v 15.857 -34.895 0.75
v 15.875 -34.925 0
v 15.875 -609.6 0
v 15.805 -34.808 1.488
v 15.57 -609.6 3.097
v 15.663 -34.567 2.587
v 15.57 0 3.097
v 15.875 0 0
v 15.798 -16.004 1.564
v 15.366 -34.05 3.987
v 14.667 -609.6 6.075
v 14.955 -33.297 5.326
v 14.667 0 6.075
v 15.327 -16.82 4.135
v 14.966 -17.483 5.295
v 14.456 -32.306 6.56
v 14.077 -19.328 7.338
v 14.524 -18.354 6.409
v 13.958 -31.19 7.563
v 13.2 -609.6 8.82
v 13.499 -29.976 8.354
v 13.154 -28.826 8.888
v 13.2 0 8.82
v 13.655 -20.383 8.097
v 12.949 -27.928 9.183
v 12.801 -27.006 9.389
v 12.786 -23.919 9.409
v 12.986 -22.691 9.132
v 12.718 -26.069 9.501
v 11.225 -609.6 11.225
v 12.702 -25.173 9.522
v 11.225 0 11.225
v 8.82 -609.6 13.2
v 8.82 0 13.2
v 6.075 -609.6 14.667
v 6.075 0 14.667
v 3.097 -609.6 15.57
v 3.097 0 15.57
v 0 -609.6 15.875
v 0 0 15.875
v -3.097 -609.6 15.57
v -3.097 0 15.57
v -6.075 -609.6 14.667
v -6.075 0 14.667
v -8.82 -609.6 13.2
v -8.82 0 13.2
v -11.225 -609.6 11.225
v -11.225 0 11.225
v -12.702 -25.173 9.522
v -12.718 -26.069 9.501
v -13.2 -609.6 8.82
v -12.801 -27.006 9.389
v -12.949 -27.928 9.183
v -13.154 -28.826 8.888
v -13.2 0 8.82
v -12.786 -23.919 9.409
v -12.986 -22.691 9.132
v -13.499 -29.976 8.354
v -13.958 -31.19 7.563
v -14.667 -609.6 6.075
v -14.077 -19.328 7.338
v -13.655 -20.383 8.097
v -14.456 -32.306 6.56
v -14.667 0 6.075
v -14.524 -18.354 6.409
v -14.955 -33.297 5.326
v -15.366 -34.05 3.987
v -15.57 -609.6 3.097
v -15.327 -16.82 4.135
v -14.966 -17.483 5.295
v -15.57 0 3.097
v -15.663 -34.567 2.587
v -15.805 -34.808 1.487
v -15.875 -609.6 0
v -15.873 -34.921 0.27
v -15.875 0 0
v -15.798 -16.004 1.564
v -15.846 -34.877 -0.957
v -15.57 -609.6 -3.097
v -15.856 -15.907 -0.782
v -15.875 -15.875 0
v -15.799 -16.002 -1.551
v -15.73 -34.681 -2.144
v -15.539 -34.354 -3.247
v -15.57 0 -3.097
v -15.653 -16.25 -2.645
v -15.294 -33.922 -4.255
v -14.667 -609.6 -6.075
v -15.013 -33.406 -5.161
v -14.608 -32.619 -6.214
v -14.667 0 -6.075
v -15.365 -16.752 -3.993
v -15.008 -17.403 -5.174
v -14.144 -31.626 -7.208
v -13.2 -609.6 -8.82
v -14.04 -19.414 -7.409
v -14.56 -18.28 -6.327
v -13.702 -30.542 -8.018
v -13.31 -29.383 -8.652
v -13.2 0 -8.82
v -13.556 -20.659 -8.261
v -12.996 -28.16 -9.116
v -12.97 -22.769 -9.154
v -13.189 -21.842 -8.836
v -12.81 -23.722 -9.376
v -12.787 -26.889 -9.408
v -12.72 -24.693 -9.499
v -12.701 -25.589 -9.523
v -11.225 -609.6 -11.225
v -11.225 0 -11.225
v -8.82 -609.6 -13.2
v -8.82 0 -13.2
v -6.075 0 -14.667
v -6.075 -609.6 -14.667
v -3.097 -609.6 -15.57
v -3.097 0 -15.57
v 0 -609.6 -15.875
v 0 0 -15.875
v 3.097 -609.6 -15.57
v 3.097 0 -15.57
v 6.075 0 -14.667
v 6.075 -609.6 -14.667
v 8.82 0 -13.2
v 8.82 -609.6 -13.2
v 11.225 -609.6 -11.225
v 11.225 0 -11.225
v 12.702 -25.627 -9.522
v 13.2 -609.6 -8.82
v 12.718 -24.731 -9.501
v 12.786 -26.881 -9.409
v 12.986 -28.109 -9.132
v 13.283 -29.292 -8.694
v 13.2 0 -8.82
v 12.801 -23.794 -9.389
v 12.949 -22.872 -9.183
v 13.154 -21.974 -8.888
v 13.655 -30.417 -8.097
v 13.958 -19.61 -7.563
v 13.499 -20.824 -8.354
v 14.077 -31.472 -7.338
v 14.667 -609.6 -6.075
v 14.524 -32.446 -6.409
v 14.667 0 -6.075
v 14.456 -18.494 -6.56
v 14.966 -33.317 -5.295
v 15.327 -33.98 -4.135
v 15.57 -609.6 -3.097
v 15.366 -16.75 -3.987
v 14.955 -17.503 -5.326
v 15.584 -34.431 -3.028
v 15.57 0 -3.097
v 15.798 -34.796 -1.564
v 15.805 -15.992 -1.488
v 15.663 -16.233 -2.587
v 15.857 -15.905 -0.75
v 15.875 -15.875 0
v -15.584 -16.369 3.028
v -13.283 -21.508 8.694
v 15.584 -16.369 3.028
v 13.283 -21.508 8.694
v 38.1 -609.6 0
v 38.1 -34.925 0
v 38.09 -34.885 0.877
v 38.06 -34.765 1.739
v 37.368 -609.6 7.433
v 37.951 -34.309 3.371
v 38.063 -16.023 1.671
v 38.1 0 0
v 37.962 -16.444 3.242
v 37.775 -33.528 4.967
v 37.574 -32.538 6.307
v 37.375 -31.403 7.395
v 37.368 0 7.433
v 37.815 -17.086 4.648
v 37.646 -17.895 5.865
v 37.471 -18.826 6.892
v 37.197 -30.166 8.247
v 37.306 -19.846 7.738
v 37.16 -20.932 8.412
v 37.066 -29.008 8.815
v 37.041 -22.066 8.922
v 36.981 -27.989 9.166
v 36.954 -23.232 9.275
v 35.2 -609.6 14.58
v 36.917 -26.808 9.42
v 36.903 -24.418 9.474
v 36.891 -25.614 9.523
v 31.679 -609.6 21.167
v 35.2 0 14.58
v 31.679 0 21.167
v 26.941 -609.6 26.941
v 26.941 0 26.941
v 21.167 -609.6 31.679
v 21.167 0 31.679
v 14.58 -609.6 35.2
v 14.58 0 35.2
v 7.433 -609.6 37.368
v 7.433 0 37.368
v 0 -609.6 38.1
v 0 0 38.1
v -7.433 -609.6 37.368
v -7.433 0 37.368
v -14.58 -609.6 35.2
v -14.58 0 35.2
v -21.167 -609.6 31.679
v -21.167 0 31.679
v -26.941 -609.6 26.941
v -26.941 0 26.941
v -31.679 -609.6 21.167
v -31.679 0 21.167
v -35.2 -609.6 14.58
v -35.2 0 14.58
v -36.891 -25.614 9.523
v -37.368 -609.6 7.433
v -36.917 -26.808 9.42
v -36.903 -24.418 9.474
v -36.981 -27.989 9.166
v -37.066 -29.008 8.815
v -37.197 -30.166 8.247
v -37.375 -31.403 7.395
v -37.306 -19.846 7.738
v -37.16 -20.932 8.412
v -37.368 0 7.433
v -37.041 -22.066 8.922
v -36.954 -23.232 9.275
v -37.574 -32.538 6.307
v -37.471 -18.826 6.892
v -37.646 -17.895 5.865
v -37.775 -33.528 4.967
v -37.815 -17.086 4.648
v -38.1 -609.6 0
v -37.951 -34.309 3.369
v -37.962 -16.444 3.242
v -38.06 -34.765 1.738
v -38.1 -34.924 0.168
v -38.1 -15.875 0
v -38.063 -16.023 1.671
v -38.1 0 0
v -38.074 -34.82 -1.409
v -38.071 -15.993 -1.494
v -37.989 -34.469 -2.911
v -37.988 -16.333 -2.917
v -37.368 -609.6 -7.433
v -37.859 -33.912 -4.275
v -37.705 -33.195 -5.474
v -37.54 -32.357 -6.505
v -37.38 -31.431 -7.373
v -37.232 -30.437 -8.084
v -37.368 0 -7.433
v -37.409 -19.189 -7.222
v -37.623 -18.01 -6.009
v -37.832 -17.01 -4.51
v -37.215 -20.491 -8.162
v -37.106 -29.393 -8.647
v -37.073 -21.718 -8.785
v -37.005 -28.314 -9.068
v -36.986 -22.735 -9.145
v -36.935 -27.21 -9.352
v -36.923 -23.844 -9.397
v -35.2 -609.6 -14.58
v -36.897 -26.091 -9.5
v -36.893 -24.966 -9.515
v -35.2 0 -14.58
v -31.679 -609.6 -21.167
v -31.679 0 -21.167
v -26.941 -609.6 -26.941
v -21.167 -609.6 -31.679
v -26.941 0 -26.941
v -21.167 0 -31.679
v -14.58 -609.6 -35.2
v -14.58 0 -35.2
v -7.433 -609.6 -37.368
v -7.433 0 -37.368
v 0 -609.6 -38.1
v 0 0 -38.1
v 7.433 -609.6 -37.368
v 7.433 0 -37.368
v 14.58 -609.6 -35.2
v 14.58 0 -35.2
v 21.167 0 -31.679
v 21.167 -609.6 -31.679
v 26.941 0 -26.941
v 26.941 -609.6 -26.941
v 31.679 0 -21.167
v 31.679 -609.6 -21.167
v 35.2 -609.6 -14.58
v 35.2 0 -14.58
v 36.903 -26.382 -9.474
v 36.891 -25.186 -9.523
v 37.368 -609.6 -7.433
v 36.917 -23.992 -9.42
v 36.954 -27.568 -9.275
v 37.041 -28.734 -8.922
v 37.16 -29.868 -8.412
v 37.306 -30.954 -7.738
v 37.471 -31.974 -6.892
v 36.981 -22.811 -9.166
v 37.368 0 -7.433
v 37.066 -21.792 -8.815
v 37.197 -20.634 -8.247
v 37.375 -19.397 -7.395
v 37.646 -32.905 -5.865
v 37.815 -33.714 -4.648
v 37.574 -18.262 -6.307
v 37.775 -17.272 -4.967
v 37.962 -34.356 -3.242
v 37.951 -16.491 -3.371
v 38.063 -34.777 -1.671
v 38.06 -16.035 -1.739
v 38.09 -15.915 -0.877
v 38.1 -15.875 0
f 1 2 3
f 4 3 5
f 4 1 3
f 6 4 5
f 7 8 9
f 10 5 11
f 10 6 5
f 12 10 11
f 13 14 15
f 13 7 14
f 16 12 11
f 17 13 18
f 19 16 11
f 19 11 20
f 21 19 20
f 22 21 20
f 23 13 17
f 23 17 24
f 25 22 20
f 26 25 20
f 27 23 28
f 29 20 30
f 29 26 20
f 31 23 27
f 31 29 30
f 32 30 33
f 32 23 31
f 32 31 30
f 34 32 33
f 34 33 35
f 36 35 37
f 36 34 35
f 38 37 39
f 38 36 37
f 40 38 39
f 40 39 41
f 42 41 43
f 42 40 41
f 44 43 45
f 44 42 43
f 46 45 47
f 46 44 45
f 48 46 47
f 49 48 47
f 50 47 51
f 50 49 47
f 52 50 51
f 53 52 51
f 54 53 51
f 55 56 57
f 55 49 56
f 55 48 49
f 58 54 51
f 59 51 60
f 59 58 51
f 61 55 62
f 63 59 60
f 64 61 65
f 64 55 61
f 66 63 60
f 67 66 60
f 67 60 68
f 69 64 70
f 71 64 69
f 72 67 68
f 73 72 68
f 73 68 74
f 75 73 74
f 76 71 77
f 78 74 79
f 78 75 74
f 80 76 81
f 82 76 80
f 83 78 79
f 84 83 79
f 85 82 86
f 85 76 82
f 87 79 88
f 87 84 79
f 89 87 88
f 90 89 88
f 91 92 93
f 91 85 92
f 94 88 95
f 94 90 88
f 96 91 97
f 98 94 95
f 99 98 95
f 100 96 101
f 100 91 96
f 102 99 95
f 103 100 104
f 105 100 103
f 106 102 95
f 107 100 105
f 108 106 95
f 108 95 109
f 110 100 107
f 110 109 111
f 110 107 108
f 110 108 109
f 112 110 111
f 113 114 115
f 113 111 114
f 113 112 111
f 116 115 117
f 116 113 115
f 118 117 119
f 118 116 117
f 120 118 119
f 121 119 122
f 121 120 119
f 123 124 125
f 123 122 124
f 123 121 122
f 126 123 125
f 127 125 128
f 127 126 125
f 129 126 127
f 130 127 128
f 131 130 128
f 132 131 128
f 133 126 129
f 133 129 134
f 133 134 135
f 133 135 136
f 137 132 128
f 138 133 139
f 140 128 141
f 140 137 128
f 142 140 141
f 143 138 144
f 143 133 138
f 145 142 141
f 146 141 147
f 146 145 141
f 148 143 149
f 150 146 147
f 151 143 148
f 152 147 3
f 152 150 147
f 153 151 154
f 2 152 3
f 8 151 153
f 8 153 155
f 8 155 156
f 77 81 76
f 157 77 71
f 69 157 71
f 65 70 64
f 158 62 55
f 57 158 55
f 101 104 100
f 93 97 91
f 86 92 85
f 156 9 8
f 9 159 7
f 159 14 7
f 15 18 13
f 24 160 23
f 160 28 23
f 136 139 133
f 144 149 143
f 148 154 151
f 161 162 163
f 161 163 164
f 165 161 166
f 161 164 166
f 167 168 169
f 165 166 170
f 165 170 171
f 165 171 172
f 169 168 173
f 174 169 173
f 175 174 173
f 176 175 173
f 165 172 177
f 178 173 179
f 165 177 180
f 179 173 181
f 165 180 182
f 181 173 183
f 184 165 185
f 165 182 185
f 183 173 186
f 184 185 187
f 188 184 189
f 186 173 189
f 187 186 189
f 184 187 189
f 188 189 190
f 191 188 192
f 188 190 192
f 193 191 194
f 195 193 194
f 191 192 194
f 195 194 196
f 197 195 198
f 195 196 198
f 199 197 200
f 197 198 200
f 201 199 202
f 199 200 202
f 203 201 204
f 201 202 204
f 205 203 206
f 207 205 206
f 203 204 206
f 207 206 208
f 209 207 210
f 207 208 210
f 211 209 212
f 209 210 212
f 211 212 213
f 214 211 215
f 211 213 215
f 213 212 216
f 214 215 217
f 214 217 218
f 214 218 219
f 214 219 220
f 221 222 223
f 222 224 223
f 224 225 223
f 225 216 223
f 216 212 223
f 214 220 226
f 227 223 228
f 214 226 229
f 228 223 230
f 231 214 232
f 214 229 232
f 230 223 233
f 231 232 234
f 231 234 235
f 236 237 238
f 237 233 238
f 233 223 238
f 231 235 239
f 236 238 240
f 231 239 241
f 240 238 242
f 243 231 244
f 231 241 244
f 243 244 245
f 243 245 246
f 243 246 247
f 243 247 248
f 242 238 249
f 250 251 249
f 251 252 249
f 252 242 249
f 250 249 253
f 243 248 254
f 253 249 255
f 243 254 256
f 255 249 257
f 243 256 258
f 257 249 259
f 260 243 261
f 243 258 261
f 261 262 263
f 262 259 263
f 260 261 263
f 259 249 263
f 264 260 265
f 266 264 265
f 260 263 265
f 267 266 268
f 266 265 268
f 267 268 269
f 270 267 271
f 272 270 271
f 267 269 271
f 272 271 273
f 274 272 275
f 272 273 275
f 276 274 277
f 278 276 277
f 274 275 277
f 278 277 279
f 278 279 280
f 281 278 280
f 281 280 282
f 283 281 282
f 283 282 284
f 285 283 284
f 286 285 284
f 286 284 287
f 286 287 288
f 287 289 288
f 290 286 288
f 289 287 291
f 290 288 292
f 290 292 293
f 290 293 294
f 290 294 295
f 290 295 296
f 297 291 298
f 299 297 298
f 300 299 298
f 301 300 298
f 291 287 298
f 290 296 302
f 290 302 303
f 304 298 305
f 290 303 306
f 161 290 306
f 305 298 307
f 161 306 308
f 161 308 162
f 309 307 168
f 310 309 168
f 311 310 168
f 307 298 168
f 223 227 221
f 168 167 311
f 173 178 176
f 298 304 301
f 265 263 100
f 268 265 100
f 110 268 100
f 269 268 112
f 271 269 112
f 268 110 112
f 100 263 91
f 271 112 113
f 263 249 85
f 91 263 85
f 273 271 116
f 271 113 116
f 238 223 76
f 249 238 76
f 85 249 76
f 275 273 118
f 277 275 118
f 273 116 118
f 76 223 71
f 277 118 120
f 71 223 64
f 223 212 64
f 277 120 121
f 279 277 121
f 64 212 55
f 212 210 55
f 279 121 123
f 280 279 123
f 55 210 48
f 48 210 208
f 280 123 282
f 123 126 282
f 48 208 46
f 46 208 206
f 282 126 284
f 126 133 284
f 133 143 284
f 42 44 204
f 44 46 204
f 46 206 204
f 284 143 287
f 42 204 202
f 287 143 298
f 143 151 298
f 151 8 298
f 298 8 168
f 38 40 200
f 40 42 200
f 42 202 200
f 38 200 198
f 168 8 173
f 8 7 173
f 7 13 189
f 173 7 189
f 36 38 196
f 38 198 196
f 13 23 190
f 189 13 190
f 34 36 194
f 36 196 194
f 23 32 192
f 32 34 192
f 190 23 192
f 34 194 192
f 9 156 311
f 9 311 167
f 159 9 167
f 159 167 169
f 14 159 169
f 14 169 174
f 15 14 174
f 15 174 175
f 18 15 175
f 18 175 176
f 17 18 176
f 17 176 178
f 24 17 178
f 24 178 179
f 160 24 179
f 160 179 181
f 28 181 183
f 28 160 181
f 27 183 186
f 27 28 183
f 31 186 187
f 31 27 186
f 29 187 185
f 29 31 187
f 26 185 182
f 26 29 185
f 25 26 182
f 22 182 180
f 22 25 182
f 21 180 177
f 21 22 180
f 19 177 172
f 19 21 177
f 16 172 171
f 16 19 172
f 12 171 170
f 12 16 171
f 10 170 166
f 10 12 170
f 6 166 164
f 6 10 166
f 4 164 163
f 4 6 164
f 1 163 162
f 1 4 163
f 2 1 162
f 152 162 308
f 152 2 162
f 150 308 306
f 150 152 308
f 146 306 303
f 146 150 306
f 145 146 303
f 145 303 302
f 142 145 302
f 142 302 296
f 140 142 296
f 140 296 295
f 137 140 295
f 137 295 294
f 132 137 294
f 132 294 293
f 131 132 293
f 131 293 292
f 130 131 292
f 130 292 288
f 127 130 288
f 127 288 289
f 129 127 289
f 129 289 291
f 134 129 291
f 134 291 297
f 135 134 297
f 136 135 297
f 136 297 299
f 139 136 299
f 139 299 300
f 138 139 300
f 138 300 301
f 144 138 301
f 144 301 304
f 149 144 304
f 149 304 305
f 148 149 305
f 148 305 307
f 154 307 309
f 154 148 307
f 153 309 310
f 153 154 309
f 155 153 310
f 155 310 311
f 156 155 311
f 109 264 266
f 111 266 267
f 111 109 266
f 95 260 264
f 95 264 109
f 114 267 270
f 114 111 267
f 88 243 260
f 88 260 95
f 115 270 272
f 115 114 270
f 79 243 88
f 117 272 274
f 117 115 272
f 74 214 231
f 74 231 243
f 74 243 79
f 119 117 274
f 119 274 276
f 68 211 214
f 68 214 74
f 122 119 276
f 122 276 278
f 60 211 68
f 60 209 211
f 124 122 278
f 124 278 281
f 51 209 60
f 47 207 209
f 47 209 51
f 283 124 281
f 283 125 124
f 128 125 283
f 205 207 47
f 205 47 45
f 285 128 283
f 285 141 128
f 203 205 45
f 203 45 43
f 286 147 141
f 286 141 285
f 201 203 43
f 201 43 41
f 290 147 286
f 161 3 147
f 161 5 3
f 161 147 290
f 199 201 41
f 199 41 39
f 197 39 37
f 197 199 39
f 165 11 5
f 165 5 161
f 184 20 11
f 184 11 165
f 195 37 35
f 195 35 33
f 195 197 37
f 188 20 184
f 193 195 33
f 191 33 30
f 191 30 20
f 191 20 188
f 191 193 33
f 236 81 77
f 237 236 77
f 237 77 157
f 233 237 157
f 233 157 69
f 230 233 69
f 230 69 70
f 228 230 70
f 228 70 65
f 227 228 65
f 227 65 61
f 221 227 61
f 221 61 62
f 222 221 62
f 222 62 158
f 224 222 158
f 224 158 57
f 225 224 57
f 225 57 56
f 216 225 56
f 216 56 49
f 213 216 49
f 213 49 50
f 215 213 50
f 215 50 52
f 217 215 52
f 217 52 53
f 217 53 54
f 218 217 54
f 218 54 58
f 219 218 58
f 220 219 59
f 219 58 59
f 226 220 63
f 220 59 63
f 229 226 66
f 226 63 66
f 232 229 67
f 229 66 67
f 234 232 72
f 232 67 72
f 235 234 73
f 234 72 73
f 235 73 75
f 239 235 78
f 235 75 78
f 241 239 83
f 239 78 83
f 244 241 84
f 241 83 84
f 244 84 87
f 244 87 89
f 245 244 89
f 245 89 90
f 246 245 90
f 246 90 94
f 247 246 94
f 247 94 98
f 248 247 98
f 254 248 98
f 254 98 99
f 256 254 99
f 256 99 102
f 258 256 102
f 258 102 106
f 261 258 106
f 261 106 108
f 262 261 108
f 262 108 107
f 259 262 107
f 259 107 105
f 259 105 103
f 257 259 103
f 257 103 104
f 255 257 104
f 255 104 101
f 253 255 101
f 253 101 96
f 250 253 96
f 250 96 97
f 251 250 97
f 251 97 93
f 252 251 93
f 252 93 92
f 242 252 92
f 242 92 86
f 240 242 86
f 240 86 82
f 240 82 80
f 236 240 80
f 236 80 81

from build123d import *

# Parameters (mm, degrees)
F0_R          = 38.1
F1_DEPTH      = 609.6
F2_R          = 9.525
F3_DEPTH      = 38.101
F3_DEPTH_BACK = 38.101
F4_R          = 15.875
F5_DEPTH      = 609.6010001


with BuildPart() as f1:
    # F0 (on Front) → F1 (new body)
    with BuildSketch(Plane.XZ):
        Circle(F0_R)
    extrude(amount=F1_DEPTH)

    # F2 (on Right) → F3 (cut, two sides)
    with BuildSketch(Plane.YZ) as f3_sk:
        with Locations((-25.4, 0)):
            Circle(F2_R)
    extrude(amount=-F3_DEPTH, mode=Mode.SUBTRACT)
    extrude(f3_sk.sketch, amount=F3_DEPTH_BACK, mode=Mode.SUBTRACT)

    # F4 (on Front) → F5 (cut, through all)
    with BuildSketch(Plane.XZ):
        Circle(F4_R)
    extrude(amount=F5_DEPTH, mode=Mode.SUBTRACT)


solid = f1.part
